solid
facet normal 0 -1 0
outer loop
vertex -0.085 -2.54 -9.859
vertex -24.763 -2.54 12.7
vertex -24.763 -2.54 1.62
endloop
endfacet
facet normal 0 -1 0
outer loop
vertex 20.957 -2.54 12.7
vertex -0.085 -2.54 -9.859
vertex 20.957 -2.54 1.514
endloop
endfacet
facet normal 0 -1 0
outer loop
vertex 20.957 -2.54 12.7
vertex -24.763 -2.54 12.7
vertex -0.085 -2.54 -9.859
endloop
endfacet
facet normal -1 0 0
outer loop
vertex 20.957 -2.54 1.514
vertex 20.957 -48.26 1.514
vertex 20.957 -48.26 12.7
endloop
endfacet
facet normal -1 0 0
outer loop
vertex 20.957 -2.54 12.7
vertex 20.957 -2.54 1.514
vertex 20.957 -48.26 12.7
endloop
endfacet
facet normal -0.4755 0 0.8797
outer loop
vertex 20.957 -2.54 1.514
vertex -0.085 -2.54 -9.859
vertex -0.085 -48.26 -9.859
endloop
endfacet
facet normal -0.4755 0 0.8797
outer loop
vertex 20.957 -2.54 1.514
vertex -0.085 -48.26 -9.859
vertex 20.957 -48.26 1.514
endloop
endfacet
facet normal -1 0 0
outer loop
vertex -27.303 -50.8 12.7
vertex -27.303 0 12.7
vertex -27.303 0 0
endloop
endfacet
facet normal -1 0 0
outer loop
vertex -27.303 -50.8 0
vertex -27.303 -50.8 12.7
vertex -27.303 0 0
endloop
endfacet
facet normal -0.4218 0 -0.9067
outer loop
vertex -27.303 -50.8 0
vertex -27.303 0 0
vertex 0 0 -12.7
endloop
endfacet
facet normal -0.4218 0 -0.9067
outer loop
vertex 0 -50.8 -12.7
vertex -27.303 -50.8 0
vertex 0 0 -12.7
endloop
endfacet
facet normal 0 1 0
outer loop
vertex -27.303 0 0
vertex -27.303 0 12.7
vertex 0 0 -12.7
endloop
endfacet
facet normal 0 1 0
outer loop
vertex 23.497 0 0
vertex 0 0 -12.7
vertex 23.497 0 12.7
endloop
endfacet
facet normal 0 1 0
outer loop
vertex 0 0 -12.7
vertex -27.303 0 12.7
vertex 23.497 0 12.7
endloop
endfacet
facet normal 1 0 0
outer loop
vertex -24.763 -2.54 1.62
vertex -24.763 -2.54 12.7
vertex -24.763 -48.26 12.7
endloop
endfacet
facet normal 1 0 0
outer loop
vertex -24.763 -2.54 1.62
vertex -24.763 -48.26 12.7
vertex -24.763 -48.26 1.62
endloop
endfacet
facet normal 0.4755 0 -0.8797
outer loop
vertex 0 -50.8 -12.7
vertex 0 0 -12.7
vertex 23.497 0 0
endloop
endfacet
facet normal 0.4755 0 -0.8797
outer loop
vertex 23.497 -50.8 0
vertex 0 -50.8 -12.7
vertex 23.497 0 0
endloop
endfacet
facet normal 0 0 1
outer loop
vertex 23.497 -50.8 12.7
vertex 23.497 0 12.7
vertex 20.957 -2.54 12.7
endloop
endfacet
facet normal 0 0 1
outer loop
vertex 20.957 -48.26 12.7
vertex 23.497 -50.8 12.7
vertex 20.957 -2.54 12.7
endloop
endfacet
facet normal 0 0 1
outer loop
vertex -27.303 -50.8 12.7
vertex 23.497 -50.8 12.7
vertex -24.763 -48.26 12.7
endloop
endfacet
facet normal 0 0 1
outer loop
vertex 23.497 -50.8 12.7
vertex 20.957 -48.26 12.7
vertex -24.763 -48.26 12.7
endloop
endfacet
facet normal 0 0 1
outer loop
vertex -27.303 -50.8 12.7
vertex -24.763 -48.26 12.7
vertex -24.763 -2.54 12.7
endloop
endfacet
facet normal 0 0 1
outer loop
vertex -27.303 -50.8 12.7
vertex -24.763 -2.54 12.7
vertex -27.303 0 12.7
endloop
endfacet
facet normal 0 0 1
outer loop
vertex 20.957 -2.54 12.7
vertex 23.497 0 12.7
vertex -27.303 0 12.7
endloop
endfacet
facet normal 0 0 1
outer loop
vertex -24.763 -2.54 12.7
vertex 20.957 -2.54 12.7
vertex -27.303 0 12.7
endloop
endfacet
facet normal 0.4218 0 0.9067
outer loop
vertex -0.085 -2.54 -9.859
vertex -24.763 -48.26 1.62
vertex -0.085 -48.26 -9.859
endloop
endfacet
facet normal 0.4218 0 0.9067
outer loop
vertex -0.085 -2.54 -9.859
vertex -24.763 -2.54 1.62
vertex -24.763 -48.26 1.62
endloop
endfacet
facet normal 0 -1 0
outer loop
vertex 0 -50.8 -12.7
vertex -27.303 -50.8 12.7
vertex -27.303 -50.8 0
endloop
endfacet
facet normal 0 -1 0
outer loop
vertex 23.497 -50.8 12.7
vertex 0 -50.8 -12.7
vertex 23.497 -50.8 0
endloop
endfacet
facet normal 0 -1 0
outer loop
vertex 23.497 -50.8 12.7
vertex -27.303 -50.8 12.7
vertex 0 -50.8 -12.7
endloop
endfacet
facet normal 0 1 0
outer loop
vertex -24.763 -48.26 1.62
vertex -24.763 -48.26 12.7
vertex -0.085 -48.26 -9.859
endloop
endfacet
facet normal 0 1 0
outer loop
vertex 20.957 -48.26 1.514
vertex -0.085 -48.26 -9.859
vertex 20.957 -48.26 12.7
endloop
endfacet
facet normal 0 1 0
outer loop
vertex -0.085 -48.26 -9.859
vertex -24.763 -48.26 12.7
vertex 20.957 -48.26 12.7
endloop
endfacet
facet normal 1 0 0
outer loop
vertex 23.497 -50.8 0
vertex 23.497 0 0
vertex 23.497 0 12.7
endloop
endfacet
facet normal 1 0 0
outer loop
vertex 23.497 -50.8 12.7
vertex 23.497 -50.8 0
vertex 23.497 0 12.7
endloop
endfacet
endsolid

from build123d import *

# Parameters (mm, degrees)
F1_DEPTH = 50.8
F2_T     = -2.54


with BuildPart() as f1:
    # F0 (on Front) → F1 (new body)
    with BuildSketch(Plane.XZ):
        Polygon((23.497318, 12.7), (0, 12.7), (0, -12.7), (23.497318, 0), align=None)
        Polygon((0, 12.7), (-27.302682, 12.7), (-27.302682, 0), (0, -12.7), align=None)
    extrude(amount=F1_DEPTH)

    # F2
    f2_openings = [f1.faces().sort_by_distance(p)[0] for p in [
        (-1.902682, -25.4, 12.7),
    ]]
    offset(amount=F2_T, openings=f2_openings)


solid = f1.part
